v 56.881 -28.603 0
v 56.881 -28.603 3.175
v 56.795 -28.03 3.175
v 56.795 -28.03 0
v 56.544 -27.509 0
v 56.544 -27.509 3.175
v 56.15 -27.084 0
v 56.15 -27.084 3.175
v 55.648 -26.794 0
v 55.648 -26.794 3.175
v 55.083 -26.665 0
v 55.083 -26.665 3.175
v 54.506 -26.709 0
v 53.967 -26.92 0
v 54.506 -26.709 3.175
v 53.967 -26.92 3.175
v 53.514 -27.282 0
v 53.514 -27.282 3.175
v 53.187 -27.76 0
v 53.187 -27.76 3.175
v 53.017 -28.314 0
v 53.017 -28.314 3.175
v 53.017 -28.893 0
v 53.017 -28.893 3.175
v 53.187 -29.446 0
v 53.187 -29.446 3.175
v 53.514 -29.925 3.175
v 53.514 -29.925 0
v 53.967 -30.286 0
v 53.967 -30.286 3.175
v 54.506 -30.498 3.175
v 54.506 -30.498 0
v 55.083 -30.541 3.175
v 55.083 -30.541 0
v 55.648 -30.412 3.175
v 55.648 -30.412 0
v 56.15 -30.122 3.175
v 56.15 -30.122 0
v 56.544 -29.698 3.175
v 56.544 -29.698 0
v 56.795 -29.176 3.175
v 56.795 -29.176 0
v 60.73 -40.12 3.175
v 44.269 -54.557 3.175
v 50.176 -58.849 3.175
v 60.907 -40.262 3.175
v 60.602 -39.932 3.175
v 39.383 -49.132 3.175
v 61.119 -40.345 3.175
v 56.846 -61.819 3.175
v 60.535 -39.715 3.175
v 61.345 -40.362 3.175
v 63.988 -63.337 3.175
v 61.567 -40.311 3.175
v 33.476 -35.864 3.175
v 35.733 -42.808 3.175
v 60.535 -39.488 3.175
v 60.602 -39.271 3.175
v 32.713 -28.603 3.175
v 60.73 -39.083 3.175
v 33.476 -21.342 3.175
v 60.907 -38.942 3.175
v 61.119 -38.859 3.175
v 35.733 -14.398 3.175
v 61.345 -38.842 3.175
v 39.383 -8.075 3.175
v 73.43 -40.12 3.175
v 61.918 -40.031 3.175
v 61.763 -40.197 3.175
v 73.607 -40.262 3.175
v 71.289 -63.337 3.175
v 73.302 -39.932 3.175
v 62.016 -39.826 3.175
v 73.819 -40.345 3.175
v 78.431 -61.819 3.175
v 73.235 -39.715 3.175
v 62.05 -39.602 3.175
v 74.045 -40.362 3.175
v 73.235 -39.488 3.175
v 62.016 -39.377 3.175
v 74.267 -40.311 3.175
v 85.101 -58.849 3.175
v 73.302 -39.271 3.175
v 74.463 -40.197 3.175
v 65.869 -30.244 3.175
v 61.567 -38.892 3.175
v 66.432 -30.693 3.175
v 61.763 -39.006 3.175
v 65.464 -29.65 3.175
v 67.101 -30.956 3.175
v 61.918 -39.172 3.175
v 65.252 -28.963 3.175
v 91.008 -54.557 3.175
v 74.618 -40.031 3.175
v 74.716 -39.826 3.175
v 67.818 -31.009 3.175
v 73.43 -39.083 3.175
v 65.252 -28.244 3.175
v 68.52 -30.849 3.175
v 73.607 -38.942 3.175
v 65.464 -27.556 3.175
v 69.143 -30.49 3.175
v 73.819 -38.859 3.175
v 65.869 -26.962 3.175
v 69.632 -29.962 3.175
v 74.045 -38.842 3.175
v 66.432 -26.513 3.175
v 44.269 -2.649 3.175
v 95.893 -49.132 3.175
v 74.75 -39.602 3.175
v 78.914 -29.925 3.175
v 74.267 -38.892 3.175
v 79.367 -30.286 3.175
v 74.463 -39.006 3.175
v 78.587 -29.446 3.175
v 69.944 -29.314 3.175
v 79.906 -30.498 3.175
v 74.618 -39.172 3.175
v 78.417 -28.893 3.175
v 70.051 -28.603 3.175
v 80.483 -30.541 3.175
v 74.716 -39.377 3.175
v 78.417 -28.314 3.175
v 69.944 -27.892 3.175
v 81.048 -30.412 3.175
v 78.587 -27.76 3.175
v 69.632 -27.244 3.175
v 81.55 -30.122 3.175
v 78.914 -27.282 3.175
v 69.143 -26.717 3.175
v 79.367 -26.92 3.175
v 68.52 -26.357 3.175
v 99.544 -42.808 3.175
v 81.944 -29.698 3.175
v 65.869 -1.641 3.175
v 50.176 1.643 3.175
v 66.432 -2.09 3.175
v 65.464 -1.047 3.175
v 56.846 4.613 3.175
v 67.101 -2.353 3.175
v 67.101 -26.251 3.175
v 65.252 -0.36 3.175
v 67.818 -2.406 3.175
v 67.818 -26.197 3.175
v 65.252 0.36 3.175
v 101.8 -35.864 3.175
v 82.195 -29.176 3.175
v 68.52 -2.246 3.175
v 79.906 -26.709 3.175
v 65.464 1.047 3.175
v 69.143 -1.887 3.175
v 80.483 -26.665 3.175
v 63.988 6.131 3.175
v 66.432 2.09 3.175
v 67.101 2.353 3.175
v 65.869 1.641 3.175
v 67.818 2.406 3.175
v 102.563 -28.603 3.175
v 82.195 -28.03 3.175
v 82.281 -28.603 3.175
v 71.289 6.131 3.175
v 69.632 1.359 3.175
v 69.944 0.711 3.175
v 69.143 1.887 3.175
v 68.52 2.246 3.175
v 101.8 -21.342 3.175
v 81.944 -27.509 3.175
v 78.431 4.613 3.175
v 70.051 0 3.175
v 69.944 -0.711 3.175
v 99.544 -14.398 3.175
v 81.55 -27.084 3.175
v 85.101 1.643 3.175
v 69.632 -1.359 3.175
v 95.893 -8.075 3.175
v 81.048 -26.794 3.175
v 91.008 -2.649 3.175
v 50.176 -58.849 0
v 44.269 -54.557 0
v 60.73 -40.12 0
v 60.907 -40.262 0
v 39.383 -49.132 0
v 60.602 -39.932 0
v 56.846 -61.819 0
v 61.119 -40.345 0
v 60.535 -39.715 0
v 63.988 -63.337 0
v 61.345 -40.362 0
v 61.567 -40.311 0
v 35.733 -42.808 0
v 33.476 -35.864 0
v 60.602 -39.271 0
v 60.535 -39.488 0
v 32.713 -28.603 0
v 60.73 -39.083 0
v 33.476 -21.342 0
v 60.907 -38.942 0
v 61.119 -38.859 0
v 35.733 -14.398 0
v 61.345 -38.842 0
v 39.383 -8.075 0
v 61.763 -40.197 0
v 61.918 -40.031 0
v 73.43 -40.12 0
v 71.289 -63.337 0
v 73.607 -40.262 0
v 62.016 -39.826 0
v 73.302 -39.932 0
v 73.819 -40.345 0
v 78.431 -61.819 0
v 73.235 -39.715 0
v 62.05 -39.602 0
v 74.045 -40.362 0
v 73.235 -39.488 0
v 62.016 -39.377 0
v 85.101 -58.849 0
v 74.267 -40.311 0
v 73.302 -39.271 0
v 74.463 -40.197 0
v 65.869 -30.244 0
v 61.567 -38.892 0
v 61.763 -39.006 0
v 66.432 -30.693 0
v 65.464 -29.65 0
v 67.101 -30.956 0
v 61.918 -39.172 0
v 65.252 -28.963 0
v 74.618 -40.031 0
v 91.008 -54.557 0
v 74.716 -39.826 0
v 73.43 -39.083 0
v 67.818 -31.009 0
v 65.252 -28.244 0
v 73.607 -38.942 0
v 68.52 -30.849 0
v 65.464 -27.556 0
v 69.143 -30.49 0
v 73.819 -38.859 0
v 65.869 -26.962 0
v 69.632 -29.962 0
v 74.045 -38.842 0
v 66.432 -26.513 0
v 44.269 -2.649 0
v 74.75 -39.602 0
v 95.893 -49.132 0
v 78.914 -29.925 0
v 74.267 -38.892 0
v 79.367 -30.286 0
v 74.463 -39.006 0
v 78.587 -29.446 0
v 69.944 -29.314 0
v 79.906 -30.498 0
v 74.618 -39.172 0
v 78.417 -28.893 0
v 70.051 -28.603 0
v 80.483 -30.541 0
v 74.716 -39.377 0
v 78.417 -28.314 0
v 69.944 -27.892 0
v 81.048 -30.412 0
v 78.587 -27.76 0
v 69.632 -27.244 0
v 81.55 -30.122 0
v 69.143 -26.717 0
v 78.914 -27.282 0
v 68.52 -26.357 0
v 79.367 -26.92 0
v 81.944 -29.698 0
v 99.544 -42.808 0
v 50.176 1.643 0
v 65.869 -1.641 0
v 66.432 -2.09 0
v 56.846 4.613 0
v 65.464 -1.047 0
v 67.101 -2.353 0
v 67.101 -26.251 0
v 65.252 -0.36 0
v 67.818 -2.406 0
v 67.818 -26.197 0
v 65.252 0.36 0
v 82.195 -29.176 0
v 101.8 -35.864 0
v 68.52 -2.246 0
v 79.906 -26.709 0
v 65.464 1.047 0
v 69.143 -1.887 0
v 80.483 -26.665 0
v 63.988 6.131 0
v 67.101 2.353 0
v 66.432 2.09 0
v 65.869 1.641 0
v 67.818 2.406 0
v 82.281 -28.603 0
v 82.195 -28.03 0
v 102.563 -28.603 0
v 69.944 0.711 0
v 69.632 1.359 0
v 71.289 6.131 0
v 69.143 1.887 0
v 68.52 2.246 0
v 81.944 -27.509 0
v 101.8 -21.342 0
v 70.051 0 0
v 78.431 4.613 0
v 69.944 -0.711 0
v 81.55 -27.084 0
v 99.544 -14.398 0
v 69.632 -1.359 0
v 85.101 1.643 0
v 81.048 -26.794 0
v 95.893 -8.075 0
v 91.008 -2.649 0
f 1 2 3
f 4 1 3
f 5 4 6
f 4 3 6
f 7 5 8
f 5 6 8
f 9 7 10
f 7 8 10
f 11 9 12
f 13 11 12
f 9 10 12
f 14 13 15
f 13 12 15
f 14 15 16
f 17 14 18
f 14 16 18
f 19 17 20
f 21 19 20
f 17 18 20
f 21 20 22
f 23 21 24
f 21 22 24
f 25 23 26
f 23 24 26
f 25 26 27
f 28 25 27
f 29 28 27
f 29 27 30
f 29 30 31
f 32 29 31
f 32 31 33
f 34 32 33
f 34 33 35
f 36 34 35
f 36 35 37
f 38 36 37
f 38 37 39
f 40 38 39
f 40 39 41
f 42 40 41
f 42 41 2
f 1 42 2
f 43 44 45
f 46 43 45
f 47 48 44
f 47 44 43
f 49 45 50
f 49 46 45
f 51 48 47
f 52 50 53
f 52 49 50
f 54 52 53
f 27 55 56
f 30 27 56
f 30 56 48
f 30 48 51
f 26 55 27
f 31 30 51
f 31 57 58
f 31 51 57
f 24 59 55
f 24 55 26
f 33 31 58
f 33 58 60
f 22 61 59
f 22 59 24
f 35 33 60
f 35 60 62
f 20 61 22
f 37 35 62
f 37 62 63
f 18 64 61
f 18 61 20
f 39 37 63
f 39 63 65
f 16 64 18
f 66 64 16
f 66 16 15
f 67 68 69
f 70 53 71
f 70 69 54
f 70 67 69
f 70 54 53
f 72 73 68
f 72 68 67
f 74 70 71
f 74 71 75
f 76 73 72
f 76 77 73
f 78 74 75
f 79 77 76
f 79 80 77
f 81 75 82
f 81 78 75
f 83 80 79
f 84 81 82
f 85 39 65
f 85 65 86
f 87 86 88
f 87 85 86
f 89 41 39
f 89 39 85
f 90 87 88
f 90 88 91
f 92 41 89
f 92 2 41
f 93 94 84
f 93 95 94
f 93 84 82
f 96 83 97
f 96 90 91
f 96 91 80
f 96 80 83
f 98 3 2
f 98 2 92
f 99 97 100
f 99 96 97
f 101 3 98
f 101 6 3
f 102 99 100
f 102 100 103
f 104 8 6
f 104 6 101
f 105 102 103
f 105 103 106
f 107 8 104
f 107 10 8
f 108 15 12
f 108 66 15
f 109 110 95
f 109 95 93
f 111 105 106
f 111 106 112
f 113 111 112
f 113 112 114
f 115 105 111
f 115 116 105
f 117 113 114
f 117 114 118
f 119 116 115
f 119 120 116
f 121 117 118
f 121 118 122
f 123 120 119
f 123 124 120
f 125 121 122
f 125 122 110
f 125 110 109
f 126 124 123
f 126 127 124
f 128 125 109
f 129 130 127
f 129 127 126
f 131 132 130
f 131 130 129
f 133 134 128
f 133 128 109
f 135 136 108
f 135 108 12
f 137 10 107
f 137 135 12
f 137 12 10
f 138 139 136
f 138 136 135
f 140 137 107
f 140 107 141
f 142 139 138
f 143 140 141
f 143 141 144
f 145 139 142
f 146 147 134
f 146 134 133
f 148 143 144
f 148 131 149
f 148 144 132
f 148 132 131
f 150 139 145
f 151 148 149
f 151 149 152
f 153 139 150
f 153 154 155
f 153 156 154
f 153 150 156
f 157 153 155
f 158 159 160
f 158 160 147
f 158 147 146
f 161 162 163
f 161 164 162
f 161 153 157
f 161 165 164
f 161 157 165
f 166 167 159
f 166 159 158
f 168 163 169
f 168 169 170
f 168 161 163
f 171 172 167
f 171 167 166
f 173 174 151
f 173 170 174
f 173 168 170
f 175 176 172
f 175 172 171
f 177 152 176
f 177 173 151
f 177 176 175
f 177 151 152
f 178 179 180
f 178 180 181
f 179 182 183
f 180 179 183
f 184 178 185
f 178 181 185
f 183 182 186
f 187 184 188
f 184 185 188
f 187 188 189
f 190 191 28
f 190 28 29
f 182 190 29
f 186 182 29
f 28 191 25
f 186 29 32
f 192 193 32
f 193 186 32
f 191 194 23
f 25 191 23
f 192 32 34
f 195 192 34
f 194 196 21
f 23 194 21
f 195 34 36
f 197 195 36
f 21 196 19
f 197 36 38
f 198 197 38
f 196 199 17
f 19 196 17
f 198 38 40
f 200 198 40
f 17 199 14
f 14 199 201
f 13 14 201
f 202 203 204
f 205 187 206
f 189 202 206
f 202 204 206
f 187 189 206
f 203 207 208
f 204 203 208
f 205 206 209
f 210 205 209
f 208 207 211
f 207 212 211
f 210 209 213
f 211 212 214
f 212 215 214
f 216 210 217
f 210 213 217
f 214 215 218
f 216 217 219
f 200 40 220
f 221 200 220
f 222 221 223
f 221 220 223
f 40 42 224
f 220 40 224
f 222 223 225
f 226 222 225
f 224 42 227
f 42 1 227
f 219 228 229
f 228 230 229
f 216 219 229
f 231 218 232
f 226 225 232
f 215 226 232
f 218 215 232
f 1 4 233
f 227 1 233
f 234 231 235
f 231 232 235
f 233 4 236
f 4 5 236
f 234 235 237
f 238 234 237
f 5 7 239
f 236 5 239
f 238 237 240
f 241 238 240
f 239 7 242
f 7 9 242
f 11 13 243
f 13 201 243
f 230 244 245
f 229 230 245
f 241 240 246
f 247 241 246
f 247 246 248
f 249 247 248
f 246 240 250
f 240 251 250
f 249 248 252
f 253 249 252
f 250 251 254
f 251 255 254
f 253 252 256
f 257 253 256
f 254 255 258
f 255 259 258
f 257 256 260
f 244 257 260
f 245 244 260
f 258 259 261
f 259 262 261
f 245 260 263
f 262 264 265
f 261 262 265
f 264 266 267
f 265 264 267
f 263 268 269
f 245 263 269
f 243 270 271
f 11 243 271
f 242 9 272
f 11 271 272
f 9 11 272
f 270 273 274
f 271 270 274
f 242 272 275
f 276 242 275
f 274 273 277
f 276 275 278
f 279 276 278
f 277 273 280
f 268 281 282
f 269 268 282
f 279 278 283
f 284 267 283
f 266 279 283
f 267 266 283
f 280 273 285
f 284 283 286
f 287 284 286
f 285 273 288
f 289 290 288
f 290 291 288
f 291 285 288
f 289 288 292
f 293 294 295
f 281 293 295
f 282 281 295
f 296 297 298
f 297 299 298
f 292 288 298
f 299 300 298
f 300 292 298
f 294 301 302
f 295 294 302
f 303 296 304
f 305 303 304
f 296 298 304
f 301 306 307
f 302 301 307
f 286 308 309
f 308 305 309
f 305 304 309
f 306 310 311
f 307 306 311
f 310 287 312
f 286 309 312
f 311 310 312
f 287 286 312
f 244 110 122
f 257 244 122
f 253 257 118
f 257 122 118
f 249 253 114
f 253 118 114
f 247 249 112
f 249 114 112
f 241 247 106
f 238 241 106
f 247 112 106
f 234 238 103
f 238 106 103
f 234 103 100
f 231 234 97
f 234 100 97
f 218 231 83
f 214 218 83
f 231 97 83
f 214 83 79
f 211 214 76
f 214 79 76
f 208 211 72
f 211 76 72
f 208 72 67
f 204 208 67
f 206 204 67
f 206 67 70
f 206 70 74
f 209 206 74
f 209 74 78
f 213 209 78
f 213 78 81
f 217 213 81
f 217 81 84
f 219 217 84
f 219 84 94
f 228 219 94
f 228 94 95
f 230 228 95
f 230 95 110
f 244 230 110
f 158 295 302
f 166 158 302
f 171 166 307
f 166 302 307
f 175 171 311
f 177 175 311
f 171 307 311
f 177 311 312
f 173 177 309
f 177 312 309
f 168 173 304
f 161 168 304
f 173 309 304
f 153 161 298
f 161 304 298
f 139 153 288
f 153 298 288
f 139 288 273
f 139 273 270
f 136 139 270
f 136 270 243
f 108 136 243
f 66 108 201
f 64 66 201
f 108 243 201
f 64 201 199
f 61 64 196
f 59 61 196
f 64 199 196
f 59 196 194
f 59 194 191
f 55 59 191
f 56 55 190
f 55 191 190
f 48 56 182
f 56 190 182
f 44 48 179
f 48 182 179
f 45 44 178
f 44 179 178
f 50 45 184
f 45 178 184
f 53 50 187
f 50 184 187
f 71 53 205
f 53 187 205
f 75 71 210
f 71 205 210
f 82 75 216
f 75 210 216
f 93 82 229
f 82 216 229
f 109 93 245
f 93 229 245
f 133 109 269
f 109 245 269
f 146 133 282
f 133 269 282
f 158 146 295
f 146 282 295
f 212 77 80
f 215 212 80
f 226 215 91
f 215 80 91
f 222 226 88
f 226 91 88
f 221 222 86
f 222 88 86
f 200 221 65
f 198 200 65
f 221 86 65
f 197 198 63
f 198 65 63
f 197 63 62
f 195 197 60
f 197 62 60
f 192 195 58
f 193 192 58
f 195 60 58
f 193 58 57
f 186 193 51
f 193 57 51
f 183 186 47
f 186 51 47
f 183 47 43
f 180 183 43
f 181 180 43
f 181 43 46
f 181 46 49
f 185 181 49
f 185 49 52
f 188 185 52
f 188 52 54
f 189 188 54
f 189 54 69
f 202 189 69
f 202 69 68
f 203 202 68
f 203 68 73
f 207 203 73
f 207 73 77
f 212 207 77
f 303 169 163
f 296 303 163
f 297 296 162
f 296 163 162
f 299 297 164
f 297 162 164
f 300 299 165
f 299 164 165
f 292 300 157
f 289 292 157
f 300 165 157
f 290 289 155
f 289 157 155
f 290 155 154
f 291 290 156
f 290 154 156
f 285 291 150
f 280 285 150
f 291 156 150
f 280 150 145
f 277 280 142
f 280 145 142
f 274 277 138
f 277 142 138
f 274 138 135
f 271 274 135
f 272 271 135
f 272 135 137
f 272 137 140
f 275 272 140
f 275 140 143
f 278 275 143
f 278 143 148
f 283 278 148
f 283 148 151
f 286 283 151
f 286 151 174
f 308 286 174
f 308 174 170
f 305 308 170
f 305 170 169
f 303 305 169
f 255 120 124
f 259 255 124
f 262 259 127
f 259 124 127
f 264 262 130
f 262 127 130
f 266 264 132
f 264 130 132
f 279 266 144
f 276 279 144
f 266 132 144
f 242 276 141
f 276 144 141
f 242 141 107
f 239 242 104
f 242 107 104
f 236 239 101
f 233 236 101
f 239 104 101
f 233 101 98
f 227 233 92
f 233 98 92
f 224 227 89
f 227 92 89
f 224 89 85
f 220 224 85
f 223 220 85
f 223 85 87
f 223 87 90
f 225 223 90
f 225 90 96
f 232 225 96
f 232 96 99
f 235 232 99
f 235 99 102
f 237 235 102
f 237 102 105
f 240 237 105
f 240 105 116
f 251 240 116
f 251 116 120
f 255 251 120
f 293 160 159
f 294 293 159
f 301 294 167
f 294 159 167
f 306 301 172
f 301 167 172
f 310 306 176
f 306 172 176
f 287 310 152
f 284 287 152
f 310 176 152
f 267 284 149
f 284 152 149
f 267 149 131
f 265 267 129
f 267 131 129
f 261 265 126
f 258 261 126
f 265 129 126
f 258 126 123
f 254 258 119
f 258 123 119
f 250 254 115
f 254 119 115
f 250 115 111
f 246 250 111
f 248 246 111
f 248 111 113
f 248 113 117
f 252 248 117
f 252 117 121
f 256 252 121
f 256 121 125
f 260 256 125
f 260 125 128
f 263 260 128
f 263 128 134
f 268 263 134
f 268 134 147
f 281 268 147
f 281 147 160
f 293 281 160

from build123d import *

# Parameters (mm, degrees)
SKETCH1_R           = 34.925
BOSS_EXTRUDE1_DEPTH = 3.175
CUT_EXTRUDE1_REACH  = 5.175
SKETCH2_R           = 2.413
CUT_EXTRUDE2_REACH  = 5.175
SKETCH4_R           = 1.9431
SKETCH4_R_2         = 0.762


with BuildPart() as part:
    # Sketch1 → Boss-Extrude1 (new body)
    with BuildSketch(Plane.XY):
        with Locations((67.638168, -28.60314574)):
            Circle(SKETCH1_R)
    extrude(amount=BOSS_EXTRUDE1_DEPTH)

    # Sketch2 → Cut-Extrude1 (cut, up to next)
    with BuildSketch(Plane.XY.offset(3.175), mode=Mode.PRIVATE) as cut_extrude1_sk1:
        with Locations((67.638168, 0)):
            Circle(SKETCH2_R)
    cut_extrude1_tool1 = extrude(cut_extrude1_sk1.sketch, amount=-CUT_EXTRUDE1_REACH, mode=Mode.PRIVATE) & part.part
    add(cut_extrude1_tool1.solids().sort_by_distance((67.638168, 0, 3.175))[0], mode=Mode.SUBTRACT)
    # Sketch2 → Cut-Extrude1 (cut, up to next)
    with BuildSketch(Plane.XY.offset(3.175), mode=Mode.PRIVATE) as cut_extrude1_sk2:
        with Locations((67.638168, -28.60314574)):
            Circle(SKETCH2_R)
    cut_extrude1_tool2 = extrude(cut_extrude1_sk2.sketch, amount=-CUT_EXTRUDE1_REACH, mode=Mode.PRIVATE) & part.part
    add(cut_extrude1_tool2.solids().sort_by_distance((67.638168, -28.603146, 3.175))[0], mode=Mode.SUBTRACT)

    # Sketch4 → Cut-Extrude2 (cut, up to next)
    with BuildSketch(Plane.XY.offset(3.175), mode=Mode.PRIVATE) as cut_extrude2_sk1:
        with Locations((54.938168, -28.60314574)):
            Circle(SKETCH4_R)
    cut_extrude2_tool1 = extrude(cut_extrude2_sk1.sketch, amount=-CUT_EXTRUDE2_REACH, mode=Mode.PRIVATE) & part.part
    add(cut_extrude2_tool1.solids().sort_by_distance((54.938168, -28.603146, 3.175))[0], mode=Mode.SUBTRACT)
    # Sketch4 → Cut-Extrude2 (cut, up to next)
    with BuildSketch(Plane.XY.offset(3.175), mode=Mode.PRIVATE) as cut_extrude2_sk2:
        with Locations((61.288168, -39.601668368)):
            Circle(SKETCH4_R_2)
    cut_extrude2_tool2 = extrude(cut_extrude2_sk2.sketch, amount=-CUT_EXTRUDE2_REACH, mode=Mode.PRIVATE) & part.part
    add(cut_extrude2_tool2.solids().sort_by_distance((61.288168, -39.601668, 3.175))[0], mode=Mode.SUBTRACT)
    # Sketch4 → Cut-Extrude2 (cut, up to next)
    with BuildSketch(Plane.XY.offset(3.175), mode=Mode.PRIVATE) as cut_extrude2_sk3:
        with Locations((80.338168, -28.60314574)):
            Circle(SKETCH4_R)
    cut_extrude2_tool3 = extrude(cut_extrude2_sk3.sketch, amount=-CUT_EXTRUDE2_REACH, mode=Mode.PRIVATE) & part.part
    add(cut_extrude2_tool3.solids().sort_by_distance((80.338168, -28.603146, 3.175))[0], mode=Mode.SUBTRACT)
    # Sketch4 → Cut-Extrude2 (cut, up to next)
    with BuildSketch(Plane.XY.offset(3.175), mode=Mode.PRIVATE) as cut_extrude2_sk4:
        with Locations((73.988168, -39.601668368)):
            Circle(SKETCH4_R_2)
    cut_extrude2_tool4 = extrude(cut_extrude2_sk4.sketch, amount=-CUT_EXTRUDE2_REACH, mode=Mode.PRIVATE) & part.part
    add(cut_extrude2_tool4.solids().sort_by_distance((73.988168, -39.601668, 3.175))[0], mode=Mode.SUBTRACT)


solid = part.part
